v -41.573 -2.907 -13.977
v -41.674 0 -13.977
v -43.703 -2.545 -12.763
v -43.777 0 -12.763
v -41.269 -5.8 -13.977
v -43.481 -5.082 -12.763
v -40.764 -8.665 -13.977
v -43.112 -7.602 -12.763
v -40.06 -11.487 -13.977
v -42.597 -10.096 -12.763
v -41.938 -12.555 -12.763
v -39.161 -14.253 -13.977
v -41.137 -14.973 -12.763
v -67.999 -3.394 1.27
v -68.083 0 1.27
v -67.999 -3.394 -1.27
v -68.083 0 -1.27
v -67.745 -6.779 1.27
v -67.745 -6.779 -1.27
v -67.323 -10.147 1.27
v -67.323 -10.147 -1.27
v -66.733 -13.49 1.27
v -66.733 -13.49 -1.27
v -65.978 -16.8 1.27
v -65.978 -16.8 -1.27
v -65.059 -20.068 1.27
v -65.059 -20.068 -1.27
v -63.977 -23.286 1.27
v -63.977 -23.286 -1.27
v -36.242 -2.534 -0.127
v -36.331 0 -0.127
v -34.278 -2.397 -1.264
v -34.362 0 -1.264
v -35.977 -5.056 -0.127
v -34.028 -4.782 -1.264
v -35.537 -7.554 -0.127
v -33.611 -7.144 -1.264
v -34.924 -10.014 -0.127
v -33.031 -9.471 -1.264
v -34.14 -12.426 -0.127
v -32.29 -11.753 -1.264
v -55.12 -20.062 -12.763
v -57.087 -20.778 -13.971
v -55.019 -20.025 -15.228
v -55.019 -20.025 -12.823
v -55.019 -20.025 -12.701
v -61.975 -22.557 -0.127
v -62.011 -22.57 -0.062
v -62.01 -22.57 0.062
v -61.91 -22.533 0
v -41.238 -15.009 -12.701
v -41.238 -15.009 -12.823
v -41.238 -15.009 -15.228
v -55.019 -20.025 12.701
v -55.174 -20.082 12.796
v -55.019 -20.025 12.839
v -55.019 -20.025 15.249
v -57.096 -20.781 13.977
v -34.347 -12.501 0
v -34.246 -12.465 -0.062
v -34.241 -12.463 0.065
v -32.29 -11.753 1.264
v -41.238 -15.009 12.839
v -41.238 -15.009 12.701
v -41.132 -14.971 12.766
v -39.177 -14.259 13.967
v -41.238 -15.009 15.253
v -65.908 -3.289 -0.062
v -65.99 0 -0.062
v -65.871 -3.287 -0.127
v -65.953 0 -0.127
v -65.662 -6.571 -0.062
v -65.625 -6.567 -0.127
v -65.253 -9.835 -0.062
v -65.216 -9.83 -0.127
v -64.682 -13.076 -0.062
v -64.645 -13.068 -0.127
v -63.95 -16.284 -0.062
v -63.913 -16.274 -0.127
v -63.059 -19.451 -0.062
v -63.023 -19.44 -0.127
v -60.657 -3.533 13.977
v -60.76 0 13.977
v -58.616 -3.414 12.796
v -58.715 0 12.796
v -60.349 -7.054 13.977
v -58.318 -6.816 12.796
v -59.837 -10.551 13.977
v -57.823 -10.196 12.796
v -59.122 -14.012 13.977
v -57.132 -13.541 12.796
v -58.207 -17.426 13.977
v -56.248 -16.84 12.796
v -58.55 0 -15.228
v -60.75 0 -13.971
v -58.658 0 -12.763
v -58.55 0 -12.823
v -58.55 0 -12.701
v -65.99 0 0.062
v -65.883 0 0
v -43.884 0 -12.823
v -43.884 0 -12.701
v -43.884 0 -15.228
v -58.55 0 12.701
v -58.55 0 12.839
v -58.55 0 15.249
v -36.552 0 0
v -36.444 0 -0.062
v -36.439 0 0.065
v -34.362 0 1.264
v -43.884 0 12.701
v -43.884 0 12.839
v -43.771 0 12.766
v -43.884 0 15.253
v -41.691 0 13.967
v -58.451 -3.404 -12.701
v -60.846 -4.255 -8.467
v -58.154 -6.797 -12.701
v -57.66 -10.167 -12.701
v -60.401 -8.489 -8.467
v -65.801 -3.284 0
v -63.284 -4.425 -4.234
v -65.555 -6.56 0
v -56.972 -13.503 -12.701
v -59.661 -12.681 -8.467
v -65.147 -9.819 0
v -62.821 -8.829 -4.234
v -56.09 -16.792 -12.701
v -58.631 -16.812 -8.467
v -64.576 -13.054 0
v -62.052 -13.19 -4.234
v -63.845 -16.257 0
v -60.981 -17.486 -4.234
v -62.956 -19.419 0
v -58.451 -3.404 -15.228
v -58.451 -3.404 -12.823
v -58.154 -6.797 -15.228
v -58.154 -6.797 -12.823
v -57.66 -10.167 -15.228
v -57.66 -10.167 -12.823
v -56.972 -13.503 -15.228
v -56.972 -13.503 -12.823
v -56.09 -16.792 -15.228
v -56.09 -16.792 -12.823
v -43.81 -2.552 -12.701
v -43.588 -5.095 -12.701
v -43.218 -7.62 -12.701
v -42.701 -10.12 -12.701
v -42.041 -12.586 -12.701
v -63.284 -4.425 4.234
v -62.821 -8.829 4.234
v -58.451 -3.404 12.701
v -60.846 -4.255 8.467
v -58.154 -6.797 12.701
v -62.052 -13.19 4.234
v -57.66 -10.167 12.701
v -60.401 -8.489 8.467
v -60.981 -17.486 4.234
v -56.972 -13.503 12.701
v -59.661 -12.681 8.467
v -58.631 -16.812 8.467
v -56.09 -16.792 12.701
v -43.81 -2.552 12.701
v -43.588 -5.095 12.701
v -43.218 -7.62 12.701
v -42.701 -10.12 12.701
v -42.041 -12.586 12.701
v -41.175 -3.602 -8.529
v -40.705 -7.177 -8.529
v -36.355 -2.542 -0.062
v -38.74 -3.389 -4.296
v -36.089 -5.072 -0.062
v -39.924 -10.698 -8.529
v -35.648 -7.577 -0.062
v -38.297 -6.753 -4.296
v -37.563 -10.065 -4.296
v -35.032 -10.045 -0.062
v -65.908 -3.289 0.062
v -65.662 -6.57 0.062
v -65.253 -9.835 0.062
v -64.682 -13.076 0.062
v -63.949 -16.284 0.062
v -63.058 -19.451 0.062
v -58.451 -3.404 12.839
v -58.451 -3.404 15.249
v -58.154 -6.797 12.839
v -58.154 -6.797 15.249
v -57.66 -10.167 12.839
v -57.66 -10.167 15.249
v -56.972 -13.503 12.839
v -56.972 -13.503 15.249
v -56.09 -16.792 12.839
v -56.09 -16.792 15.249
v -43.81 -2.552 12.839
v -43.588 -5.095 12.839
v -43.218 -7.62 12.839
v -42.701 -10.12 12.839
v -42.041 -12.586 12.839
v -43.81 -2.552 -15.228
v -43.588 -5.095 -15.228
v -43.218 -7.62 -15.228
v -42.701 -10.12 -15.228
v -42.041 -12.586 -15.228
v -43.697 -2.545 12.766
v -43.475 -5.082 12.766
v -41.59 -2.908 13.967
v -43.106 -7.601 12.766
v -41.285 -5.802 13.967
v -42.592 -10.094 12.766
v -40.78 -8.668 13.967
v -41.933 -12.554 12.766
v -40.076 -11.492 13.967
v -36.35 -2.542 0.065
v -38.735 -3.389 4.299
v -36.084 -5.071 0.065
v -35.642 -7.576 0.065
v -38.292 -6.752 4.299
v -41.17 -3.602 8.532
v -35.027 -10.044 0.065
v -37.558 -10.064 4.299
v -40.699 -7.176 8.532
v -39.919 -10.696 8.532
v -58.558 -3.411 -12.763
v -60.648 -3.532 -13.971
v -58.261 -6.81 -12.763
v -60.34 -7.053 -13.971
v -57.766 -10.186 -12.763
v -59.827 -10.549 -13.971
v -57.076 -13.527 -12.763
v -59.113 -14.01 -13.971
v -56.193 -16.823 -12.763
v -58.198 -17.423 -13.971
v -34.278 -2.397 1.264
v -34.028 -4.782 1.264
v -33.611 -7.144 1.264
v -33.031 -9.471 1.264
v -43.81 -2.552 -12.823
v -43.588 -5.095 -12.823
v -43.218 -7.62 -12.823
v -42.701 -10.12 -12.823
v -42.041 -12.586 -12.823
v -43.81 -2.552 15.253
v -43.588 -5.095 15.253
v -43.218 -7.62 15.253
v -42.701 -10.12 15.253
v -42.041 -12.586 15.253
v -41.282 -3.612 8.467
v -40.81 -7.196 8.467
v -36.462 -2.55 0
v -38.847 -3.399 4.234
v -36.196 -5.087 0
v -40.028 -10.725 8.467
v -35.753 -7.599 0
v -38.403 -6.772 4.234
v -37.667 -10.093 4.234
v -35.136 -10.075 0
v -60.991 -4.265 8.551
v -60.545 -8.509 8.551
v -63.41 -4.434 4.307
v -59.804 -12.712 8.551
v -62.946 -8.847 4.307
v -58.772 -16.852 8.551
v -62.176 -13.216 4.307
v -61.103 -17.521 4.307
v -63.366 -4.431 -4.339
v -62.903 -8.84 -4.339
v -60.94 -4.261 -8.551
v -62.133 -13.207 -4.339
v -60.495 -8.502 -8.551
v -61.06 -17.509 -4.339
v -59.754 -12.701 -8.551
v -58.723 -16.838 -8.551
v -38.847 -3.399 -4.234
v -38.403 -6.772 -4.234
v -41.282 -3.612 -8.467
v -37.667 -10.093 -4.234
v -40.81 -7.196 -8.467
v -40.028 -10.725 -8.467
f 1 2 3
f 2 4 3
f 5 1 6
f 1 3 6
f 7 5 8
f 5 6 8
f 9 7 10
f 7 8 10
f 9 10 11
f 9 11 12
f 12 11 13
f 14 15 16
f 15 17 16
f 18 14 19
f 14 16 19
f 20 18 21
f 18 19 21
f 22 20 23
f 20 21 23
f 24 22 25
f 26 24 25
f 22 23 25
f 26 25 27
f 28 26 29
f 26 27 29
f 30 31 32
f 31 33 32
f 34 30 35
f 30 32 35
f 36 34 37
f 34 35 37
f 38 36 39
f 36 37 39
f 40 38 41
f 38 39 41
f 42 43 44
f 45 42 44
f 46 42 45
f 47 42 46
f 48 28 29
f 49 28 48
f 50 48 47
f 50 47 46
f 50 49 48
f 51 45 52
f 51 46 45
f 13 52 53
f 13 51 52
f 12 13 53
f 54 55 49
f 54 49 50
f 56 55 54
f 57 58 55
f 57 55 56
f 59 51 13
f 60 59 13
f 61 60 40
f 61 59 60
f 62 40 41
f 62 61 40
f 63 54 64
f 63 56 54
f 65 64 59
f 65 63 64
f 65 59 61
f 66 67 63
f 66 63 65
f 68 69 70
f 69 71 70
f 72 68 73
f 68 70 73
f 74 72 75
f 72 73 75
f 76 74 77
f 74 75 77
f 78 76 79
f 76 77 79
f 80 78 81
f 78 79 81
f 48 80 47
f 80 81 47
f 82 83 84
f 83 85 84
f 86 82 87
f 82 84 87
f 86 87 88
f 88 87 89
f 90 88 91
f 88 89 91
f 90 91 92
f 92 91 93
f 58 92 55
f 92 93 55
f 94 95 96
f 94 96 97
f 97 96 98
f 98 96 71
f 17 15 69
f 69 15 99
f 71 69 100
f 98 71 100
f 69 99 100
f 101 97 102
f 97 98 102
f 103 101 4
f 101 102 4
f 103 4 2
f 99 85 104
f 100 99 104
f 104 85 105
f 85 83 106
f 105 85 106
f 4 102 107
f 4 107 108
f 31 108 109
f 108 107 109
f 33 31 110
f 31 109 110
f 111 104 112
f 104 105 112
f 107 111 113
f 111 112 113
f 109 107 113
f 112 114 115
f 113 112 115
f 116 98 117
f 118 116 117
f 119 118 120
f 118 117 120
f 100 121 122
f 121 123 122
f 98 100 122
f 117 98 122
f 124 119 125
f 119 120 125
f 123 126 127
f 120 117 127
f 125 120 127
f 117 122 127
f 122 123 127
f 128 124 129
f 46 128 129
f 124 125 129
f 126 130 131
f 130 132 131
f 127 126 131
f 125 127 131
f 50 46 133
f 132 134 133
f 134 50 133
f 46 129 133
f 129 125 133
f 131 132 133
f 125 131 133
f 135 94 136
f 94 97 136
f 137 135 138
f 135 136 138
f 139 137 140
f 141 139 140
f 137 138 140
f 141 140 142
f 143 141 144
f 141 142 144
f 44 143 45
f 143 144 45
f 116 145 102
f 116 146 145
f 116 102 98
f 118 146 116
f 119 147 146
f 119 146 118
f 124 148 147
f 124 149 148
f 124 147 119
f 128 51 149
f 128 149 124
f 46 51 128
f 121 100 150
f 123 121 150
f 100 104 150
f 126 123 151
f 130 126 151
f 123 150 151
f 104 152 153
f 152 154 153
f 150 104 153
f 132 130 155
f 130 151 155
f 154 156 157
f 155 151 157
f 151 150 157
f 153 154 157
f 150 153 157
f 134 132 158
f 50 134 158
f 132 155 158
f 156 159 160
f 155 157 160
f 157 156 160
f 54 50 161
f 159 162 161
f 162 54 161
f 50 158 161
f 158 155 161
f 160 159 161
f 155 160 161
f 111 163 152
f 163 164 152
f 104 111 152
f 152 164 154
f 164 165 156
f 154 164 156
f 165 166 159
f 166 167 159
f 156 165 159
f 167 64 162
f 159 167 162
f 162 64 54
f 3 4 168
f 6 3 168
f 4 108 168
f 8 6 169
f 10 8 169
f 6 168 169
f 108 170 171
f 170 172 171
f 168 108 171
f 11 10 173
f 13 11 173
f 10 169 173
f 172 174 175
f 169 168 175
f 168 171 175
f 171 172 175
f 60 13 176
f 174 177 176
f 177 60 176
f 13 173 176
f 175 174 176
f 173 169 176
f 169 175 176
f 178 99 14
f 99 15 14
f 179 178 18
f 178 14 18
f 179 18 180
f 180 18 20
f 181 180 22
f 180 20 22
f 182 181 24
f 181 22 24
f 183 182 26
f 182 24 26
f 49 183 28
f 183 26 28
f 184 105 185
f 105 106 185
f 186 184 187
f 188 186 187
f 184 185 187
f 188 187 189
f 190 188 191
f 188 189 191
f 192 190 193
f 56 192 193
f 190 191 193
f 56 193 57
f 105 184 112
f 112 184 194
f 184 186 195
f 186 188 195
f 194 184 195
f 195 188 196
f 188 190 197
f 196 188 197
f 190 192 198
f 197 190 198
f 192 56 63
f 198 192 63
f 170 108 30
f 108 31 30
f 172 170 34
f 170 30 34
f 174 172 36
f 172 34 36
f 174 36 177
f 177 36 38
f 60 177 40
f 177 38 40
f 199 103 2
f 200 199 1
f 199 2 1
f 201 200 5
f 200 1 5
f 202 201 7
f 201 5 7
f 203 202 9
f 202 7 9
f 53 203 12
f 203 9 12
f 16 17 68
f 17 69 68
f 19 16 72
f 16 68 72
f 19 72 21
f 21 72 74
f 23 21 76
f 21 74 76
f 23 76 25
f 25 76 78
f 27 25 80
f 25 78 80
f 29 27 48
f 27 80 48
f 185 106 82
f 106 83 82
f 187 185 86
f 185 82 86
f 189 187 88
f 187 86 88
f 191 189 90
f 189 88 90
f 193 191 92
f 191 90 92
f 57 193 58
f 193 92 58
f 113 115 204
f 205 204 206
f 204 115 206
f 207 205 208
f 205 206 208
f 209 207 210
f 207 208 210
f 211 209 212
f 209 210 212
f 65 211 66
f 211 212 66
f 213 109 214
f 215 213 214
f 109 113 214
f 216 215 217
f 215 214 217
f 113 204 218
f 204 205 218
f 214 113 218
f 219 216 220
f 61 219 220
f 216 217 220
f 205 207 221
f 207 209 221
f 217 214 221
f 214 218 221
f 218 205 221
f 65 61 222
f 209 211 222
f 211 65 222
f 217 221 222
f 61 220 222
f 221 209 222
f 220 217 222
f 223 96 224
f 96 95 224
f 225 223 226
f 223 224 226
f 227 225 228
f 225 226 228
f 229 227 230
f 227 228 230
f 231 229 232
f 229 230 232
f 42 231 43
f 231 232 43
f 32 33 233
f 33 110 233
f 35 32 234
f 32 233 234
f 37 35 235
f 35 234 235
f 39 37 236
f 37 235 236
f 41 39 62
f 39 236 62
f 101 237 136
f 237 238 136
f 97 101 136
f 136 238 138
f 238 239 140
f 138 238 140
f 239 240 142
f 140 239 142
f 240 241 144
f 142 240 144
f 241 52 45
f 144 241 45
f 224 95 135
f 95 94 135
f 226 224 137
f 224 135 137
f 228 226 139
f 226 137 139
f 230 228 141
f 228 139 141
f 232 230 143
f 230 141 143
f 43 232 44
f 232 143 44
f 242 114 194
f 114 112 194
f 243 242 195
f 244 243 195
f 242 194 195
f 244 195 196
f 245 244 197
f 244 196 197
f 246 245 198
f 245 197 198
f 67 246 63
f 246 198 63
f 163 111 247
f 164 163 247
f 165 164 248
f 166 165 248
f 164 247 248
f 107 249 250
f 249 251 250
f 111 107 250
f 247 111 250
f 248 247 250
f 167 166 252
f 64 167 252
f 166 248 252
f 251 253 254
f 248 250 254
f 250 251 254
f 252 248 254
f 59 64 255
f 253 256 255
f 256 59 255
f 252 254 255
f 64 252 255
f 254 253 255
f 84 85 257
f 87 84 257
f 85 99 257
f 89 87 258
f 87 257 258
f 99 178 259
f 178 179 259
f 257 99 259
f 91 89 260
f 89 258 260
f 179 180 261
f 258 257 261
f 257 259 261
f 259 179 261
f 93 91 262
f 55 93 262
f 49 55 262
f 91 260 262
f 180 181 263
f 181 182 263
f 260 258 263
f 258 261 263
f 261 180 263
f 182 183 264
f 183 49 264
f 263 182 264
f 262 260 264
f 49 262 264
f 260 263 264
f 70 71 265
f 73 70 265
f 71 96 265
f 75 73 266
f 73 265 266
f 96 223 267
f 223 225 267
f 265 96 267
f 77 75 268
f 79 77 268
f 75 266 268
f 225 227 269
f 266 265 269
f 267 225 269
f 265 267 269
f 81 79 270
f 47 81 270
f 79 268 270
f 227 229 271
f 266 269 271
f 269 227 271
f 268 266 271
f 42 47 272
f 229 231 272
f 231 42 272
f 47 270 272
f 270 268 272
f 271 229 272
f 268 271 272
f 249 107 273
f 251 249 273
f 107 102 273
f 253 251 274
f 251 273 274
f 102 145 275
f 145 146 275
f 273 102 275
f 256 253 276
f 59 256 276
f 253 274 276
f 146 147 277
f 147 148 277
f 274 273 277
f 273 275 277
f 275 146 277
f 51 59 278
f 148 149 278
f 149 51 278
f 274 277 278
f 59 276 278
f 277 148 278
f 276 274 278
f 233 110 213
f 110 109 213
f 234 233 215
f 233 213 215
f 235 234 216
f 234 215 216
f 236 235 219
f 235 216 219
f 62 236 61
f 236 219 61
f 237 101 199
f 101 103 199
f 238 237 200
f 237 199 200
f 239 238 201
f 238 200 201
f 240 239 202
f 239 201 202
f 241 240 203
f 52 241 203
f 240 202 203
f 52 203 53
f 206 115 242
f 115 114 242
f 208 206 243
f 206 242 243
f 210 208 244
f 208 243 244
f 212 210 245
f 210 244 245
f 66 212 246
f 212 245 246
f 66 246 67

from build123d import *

# Parameters (mm, degrees)
F1_W     = 14.6656349089
F1_H     = 0.1217532289
F2_ANGLE = 20


with BuildPart() as f2:
    # F1 (on Front) → F2 (revolve)
    with BuildSketch(Plane.XZ):
        Polygon((-43.7767438772, 12.7751471548), (-43.8843175875, 12.7008123937), (-43.7714494091, 12.7659768669), align=None)
        Polygon((-36.4386319546, 0.0651644732), (-36.5515001331, 0), (-36.4439264228, -0.0621077106), (-36.3309057177, -0.1273602451), (-34.3620503103, -1.2640794445), (-34.3620503103, 1.2640794445), align=None)
        Polygon((-58.7149140006, 12.7960529626), (-58.5499524964, 12.7008123937), (-58.5499524964, 12.8391478211), (-58.5499524964, 15.2491778135), (-60.7598529608, 13.9766990217), align=None)
        Polygon((-43.7767438772, -12.7629201043), (-43.8843175875, -12.7008123937), (-43.8843175875, -12.8225656226), (-43.8843175875, -15.2283469215), (-41.6742515512, -13.9767946147), align=None)
        Polygon((-58.5499524964, -12.8225656226), (-58.5499524964, -12.7008123937), (-58.6575262067, -12.7629201043), (-60.7503676631, -13.9712226825), (-58.5499524964, -15.2283469215), align=None)
        Polygon((-65.9903436611, -0.0621077106), (-65.8827699508, 0), (-65.9900653034, 0.0619470007), (-68.0832503253, 1.2704479365), (-68.0832503253, -1.2704479365), align=None)
        Polygon((-43.8843175875, 12.7008123937), (-36.5515001331, 0), (-36.4386319546, 0.0651644732), (-43.7714494091, 12.7659768669), align=None)
        Polygon((-36.5515001331, 0), (-43.8843175875, -12.7008123937), (-43.7767438772, -12.7629201043), (-36.4439264228, -0.0621077106), align=None)
        Polygon((-58.5499524964, 12.8391478211), (-58.5499524964, 12.7008123937), (-51.217135042, 12.7008123937), (-43.8843175875, 12.7008123937), (-43.8843175875, 12.8391478211), align=None)
        Polygon((-43.8843175875, 15.2525296435), (-43.8843175875, 12.8391478211), (-43.8843175875, 12.7008123937), (-43.7767438772, 12.7751471548), (-43.7714494091, 12.7659768669), (-41.6910577545, 13.9670915487), align=None)
        Polygon((-65.9900653034, 0.0619470007), (-65.8827699508, 0), (-58.5499524964, 12.7008123937), (-58.7149140006, 12.7960529626), align=None)
        with Locations((-51.217135042, -12.7616890082)):
            Rectangle(F1_W, F1_H)
        Polygon((-58.5499524964, -12.7008123937), (-65.8827699508, 0), (-65.9903436611, -0.0621077106), (-65.9526700928, -0.1273602451), (-58.6575262067, -12.7629201043), align=None)
    revolve(axis=Axis((0, 0, 0), (0, 0, 1)), revolution_arc=F2_ANGLE)


solid = f2.part
